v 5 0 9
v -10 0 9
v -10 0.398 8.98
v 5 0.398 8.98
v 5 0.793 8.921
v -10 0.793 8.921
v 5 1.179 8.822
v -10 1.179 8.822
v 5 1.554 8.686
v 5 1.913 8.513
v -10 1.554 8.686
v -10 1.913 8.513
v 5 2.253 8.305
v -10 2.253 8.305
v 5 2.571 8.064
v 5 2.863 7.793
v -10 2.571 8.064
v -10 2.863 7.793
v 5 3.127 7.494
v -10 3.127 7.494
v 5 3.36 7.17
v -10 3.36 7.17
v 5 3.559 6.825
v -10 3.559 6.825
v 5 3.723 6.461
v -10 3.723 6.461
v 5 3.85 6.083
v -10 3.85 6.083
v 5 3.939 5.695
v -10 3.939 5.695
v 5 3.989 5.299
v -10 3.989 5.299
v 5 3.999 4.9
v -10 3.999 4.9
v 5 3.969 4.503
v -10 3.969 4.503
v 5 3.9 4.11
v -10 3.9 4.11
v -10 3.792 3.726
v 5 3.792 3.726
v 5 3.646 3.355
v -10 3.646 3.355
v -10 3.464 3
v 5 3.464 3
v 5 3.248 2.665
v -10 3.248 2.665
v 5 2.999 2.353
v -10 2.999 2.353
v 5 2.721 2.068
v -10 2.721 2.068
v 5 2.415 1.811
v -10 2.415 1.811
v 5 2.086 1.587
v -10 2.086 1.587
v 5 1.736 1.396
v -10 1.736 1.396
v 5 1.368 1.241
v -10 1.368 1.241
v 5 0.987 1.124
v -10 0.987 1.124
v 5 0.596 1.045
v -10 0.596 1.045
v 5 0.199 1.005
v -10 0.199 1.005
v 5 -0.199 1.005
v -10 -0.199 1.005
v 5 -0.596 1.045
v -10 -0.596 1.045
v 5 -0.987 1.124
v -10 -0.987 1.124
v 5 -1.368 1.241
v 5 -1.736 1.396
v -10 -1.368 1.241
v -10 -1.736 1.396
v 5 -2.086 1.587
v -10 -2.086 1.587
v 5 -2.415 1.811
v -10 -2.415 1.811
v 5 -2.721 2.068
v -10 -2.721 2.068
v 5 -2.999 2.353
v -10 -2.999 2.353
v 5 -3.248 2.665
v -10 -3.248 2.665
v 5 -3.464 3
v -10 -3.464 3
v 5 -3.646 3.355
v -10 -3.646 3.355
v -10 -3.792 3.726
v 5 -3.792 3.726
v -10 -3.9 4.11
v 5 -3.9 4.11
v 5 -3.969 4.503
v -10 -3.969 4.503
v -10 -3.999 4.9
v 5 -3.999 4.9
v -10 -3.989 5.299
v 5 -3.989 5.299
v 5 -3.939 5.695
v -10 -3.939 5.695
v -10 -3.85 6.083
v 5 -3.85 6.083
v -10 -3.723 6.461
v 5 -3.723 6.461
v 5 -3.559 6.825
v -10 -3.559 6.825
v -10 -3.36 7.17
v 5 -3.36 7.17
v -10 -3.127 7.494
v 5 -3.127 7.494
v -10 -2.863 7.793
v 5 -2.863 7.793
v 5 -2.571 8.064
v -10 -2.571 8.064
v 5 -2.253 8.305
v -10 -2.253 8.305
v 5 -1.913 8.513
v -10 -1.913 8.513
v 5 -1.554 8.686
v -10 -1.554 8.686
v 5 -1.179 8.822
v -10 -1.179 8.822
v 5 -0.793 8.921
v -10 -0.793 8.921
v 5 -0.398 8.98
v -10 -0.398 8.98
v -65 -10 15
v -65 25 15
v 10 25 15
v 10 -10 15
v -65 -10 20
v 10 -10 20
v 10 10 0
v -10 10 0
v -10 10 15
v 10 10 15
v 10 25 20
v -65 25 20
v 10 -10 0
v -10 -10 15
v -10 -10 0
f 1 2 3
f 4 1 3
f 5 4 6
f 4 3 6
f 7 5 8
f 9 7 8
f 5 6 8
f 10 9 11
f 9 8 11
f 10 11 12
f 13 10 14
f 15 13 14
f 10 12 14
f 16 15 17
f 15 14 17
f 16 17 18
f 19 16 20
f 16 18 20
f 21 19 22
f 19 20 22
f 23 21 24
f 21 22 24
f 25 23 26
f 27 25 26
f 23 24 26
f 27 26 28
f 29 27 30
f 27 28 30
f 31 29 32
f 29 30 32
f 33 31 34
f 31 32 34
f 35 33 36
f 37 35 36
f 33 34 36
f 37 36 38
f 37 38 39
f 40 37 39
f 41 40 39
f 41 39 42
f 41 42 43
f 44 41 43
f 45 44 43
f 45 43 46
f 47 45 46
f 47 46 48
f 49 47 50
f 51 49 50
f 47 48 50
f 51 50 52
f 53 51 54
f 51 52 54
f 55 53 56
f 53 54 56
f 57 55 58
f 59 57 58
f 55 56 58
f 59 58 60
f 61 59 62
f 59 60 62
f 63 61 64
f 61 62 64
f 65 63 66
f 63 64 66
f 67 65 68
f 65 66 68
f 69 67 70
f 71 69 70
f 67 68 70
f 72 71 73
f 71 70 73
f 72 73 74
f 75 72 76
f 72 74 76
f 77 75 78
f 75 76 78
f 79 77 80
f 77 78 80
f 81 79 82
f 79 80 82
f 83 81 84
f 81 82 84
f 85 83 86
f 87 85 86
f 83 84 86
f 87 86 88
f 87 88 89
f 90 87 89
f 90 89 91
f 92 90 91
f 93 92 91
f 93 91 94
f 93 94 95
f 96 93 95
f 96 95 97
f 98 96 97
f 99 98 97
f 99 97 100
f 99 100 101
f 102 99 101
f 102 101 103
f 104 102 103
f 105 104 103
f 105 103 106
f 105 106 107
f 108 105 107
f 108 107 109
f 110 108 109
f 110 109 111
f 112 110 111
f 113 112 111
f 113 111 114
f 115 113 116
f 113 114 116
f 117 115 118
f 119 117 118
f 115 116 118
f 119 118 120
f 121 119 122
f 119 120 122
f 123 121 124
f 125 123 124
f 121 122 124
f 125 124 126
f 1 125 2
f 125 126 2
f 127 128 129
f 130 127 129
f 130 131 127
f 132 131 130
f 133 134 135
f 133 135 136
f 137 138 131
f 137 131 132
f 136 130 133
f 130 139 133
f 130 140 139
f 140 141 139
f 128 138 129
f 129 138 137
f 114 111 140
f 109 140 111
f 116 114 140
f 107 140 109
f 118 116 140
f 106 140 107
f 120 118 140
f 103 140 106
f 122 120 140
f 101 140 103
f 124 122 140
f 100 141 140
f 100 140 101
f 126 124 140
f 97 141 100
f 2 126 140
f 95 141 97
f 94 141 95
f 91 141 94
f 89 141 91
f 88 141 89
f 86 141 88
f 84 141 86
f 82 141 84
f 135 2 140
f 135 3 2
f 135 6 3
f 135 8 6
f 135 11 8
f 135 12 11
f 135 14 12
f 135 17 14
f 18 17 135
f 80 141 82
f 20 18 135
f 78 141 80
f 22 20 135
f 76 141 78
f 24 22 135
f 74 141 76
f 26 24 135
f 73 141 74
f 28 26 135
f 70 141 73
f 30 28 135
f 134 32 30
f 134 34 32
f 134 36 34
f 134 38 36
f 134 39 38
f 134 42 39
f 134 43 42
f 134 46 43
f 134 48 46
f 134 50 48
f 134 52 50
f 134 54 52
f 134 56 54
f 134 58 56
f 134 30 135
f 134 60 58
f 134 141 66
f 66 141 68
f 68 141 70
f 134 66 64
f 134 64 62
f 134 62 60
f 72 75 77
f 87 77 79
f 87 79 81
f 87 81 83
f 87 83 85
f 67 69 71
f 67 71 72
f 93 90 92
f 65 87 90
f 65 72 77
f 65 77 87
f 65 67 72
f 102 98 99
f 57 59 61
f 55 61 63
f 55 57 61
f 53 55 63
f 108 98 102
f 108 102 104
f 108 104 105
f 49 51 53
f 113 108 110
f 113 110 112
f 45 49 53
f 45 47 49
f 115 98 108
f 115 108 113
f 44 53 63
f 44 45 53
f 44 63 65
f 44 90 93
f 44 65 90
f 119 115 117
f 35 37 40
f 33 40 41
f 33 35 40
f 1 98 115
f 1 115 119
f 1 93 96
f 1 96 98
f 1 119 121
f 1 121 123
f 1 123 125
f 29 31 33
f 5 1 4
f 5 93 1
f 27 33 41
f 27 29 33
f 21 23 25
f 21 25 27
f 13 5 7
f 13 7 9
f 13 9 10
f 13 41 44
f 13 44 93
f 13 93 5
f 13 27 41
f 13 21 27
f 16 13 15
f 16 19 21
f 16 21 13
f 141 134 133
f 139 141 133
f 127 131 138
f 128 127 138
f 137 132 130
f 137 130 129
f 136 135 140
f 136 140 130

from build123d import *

# Parameters (mm, degrees)
SKETCH_1_W          = 20
SKETCH_1_H          = 20
EXTRUDE_1_DEPTH     = 10
SKETCH_2_R          = 4
CUT_EXTRUDE_1_DEPTH = 15
EXTRUDE_START       = 10
SKETCH_3_W          = 75
SKETCH_3_H          = 35
EXTRUDE_2_DEPTH     = 5
SKETCH_4_W          = 20
SKETCH_4_H          = 20
EXTRUDE_3_DEPTH     = 5


with BuildPart() as part:
    # 草图1 → 凸台-拉伸1 (new body)
    with BuildSketch(Plane.XY):
        Rectangle(SKETCH_1_W, SKETCH_1_H)
    extrude(amount=EXTRUDE_1_DEPTH)

    # 草图2 → 切除-拉伸1 (cut)
    with BuildSketch(Plane.ZY.offset(10)):
        with Locations((5, 0)):
            Circle(SKETCH_2_R)
    extrude(amount=-CUT_EXTRUDE_1_DEPTH, mode=Mode.SUBTRACT)

    # 草图4 → 凸台-拉伸3 (add)
    with BuildSketch(Plane.XY.offset(10)):
        Rectangle(SKETCH_4_W, SKETCH_4_H)
    extrude(amount=EXTRUDE_3_DEPTH)


with BuildPart() as body_2:
    # 草图3 → 凸台-拉伸2 (new body)
    with BuildSketch(Plane.XY.offset(10).offset(EXTRUDE_START)):
        with Locations((-27.5, 7.5)):
            Rectangle(SKETCH_3_W, SKETCH_3_H)
    extrude(amount=-EXTRUDE_2_DEPTH)


solid = Compound([part.part, body_2.part])
